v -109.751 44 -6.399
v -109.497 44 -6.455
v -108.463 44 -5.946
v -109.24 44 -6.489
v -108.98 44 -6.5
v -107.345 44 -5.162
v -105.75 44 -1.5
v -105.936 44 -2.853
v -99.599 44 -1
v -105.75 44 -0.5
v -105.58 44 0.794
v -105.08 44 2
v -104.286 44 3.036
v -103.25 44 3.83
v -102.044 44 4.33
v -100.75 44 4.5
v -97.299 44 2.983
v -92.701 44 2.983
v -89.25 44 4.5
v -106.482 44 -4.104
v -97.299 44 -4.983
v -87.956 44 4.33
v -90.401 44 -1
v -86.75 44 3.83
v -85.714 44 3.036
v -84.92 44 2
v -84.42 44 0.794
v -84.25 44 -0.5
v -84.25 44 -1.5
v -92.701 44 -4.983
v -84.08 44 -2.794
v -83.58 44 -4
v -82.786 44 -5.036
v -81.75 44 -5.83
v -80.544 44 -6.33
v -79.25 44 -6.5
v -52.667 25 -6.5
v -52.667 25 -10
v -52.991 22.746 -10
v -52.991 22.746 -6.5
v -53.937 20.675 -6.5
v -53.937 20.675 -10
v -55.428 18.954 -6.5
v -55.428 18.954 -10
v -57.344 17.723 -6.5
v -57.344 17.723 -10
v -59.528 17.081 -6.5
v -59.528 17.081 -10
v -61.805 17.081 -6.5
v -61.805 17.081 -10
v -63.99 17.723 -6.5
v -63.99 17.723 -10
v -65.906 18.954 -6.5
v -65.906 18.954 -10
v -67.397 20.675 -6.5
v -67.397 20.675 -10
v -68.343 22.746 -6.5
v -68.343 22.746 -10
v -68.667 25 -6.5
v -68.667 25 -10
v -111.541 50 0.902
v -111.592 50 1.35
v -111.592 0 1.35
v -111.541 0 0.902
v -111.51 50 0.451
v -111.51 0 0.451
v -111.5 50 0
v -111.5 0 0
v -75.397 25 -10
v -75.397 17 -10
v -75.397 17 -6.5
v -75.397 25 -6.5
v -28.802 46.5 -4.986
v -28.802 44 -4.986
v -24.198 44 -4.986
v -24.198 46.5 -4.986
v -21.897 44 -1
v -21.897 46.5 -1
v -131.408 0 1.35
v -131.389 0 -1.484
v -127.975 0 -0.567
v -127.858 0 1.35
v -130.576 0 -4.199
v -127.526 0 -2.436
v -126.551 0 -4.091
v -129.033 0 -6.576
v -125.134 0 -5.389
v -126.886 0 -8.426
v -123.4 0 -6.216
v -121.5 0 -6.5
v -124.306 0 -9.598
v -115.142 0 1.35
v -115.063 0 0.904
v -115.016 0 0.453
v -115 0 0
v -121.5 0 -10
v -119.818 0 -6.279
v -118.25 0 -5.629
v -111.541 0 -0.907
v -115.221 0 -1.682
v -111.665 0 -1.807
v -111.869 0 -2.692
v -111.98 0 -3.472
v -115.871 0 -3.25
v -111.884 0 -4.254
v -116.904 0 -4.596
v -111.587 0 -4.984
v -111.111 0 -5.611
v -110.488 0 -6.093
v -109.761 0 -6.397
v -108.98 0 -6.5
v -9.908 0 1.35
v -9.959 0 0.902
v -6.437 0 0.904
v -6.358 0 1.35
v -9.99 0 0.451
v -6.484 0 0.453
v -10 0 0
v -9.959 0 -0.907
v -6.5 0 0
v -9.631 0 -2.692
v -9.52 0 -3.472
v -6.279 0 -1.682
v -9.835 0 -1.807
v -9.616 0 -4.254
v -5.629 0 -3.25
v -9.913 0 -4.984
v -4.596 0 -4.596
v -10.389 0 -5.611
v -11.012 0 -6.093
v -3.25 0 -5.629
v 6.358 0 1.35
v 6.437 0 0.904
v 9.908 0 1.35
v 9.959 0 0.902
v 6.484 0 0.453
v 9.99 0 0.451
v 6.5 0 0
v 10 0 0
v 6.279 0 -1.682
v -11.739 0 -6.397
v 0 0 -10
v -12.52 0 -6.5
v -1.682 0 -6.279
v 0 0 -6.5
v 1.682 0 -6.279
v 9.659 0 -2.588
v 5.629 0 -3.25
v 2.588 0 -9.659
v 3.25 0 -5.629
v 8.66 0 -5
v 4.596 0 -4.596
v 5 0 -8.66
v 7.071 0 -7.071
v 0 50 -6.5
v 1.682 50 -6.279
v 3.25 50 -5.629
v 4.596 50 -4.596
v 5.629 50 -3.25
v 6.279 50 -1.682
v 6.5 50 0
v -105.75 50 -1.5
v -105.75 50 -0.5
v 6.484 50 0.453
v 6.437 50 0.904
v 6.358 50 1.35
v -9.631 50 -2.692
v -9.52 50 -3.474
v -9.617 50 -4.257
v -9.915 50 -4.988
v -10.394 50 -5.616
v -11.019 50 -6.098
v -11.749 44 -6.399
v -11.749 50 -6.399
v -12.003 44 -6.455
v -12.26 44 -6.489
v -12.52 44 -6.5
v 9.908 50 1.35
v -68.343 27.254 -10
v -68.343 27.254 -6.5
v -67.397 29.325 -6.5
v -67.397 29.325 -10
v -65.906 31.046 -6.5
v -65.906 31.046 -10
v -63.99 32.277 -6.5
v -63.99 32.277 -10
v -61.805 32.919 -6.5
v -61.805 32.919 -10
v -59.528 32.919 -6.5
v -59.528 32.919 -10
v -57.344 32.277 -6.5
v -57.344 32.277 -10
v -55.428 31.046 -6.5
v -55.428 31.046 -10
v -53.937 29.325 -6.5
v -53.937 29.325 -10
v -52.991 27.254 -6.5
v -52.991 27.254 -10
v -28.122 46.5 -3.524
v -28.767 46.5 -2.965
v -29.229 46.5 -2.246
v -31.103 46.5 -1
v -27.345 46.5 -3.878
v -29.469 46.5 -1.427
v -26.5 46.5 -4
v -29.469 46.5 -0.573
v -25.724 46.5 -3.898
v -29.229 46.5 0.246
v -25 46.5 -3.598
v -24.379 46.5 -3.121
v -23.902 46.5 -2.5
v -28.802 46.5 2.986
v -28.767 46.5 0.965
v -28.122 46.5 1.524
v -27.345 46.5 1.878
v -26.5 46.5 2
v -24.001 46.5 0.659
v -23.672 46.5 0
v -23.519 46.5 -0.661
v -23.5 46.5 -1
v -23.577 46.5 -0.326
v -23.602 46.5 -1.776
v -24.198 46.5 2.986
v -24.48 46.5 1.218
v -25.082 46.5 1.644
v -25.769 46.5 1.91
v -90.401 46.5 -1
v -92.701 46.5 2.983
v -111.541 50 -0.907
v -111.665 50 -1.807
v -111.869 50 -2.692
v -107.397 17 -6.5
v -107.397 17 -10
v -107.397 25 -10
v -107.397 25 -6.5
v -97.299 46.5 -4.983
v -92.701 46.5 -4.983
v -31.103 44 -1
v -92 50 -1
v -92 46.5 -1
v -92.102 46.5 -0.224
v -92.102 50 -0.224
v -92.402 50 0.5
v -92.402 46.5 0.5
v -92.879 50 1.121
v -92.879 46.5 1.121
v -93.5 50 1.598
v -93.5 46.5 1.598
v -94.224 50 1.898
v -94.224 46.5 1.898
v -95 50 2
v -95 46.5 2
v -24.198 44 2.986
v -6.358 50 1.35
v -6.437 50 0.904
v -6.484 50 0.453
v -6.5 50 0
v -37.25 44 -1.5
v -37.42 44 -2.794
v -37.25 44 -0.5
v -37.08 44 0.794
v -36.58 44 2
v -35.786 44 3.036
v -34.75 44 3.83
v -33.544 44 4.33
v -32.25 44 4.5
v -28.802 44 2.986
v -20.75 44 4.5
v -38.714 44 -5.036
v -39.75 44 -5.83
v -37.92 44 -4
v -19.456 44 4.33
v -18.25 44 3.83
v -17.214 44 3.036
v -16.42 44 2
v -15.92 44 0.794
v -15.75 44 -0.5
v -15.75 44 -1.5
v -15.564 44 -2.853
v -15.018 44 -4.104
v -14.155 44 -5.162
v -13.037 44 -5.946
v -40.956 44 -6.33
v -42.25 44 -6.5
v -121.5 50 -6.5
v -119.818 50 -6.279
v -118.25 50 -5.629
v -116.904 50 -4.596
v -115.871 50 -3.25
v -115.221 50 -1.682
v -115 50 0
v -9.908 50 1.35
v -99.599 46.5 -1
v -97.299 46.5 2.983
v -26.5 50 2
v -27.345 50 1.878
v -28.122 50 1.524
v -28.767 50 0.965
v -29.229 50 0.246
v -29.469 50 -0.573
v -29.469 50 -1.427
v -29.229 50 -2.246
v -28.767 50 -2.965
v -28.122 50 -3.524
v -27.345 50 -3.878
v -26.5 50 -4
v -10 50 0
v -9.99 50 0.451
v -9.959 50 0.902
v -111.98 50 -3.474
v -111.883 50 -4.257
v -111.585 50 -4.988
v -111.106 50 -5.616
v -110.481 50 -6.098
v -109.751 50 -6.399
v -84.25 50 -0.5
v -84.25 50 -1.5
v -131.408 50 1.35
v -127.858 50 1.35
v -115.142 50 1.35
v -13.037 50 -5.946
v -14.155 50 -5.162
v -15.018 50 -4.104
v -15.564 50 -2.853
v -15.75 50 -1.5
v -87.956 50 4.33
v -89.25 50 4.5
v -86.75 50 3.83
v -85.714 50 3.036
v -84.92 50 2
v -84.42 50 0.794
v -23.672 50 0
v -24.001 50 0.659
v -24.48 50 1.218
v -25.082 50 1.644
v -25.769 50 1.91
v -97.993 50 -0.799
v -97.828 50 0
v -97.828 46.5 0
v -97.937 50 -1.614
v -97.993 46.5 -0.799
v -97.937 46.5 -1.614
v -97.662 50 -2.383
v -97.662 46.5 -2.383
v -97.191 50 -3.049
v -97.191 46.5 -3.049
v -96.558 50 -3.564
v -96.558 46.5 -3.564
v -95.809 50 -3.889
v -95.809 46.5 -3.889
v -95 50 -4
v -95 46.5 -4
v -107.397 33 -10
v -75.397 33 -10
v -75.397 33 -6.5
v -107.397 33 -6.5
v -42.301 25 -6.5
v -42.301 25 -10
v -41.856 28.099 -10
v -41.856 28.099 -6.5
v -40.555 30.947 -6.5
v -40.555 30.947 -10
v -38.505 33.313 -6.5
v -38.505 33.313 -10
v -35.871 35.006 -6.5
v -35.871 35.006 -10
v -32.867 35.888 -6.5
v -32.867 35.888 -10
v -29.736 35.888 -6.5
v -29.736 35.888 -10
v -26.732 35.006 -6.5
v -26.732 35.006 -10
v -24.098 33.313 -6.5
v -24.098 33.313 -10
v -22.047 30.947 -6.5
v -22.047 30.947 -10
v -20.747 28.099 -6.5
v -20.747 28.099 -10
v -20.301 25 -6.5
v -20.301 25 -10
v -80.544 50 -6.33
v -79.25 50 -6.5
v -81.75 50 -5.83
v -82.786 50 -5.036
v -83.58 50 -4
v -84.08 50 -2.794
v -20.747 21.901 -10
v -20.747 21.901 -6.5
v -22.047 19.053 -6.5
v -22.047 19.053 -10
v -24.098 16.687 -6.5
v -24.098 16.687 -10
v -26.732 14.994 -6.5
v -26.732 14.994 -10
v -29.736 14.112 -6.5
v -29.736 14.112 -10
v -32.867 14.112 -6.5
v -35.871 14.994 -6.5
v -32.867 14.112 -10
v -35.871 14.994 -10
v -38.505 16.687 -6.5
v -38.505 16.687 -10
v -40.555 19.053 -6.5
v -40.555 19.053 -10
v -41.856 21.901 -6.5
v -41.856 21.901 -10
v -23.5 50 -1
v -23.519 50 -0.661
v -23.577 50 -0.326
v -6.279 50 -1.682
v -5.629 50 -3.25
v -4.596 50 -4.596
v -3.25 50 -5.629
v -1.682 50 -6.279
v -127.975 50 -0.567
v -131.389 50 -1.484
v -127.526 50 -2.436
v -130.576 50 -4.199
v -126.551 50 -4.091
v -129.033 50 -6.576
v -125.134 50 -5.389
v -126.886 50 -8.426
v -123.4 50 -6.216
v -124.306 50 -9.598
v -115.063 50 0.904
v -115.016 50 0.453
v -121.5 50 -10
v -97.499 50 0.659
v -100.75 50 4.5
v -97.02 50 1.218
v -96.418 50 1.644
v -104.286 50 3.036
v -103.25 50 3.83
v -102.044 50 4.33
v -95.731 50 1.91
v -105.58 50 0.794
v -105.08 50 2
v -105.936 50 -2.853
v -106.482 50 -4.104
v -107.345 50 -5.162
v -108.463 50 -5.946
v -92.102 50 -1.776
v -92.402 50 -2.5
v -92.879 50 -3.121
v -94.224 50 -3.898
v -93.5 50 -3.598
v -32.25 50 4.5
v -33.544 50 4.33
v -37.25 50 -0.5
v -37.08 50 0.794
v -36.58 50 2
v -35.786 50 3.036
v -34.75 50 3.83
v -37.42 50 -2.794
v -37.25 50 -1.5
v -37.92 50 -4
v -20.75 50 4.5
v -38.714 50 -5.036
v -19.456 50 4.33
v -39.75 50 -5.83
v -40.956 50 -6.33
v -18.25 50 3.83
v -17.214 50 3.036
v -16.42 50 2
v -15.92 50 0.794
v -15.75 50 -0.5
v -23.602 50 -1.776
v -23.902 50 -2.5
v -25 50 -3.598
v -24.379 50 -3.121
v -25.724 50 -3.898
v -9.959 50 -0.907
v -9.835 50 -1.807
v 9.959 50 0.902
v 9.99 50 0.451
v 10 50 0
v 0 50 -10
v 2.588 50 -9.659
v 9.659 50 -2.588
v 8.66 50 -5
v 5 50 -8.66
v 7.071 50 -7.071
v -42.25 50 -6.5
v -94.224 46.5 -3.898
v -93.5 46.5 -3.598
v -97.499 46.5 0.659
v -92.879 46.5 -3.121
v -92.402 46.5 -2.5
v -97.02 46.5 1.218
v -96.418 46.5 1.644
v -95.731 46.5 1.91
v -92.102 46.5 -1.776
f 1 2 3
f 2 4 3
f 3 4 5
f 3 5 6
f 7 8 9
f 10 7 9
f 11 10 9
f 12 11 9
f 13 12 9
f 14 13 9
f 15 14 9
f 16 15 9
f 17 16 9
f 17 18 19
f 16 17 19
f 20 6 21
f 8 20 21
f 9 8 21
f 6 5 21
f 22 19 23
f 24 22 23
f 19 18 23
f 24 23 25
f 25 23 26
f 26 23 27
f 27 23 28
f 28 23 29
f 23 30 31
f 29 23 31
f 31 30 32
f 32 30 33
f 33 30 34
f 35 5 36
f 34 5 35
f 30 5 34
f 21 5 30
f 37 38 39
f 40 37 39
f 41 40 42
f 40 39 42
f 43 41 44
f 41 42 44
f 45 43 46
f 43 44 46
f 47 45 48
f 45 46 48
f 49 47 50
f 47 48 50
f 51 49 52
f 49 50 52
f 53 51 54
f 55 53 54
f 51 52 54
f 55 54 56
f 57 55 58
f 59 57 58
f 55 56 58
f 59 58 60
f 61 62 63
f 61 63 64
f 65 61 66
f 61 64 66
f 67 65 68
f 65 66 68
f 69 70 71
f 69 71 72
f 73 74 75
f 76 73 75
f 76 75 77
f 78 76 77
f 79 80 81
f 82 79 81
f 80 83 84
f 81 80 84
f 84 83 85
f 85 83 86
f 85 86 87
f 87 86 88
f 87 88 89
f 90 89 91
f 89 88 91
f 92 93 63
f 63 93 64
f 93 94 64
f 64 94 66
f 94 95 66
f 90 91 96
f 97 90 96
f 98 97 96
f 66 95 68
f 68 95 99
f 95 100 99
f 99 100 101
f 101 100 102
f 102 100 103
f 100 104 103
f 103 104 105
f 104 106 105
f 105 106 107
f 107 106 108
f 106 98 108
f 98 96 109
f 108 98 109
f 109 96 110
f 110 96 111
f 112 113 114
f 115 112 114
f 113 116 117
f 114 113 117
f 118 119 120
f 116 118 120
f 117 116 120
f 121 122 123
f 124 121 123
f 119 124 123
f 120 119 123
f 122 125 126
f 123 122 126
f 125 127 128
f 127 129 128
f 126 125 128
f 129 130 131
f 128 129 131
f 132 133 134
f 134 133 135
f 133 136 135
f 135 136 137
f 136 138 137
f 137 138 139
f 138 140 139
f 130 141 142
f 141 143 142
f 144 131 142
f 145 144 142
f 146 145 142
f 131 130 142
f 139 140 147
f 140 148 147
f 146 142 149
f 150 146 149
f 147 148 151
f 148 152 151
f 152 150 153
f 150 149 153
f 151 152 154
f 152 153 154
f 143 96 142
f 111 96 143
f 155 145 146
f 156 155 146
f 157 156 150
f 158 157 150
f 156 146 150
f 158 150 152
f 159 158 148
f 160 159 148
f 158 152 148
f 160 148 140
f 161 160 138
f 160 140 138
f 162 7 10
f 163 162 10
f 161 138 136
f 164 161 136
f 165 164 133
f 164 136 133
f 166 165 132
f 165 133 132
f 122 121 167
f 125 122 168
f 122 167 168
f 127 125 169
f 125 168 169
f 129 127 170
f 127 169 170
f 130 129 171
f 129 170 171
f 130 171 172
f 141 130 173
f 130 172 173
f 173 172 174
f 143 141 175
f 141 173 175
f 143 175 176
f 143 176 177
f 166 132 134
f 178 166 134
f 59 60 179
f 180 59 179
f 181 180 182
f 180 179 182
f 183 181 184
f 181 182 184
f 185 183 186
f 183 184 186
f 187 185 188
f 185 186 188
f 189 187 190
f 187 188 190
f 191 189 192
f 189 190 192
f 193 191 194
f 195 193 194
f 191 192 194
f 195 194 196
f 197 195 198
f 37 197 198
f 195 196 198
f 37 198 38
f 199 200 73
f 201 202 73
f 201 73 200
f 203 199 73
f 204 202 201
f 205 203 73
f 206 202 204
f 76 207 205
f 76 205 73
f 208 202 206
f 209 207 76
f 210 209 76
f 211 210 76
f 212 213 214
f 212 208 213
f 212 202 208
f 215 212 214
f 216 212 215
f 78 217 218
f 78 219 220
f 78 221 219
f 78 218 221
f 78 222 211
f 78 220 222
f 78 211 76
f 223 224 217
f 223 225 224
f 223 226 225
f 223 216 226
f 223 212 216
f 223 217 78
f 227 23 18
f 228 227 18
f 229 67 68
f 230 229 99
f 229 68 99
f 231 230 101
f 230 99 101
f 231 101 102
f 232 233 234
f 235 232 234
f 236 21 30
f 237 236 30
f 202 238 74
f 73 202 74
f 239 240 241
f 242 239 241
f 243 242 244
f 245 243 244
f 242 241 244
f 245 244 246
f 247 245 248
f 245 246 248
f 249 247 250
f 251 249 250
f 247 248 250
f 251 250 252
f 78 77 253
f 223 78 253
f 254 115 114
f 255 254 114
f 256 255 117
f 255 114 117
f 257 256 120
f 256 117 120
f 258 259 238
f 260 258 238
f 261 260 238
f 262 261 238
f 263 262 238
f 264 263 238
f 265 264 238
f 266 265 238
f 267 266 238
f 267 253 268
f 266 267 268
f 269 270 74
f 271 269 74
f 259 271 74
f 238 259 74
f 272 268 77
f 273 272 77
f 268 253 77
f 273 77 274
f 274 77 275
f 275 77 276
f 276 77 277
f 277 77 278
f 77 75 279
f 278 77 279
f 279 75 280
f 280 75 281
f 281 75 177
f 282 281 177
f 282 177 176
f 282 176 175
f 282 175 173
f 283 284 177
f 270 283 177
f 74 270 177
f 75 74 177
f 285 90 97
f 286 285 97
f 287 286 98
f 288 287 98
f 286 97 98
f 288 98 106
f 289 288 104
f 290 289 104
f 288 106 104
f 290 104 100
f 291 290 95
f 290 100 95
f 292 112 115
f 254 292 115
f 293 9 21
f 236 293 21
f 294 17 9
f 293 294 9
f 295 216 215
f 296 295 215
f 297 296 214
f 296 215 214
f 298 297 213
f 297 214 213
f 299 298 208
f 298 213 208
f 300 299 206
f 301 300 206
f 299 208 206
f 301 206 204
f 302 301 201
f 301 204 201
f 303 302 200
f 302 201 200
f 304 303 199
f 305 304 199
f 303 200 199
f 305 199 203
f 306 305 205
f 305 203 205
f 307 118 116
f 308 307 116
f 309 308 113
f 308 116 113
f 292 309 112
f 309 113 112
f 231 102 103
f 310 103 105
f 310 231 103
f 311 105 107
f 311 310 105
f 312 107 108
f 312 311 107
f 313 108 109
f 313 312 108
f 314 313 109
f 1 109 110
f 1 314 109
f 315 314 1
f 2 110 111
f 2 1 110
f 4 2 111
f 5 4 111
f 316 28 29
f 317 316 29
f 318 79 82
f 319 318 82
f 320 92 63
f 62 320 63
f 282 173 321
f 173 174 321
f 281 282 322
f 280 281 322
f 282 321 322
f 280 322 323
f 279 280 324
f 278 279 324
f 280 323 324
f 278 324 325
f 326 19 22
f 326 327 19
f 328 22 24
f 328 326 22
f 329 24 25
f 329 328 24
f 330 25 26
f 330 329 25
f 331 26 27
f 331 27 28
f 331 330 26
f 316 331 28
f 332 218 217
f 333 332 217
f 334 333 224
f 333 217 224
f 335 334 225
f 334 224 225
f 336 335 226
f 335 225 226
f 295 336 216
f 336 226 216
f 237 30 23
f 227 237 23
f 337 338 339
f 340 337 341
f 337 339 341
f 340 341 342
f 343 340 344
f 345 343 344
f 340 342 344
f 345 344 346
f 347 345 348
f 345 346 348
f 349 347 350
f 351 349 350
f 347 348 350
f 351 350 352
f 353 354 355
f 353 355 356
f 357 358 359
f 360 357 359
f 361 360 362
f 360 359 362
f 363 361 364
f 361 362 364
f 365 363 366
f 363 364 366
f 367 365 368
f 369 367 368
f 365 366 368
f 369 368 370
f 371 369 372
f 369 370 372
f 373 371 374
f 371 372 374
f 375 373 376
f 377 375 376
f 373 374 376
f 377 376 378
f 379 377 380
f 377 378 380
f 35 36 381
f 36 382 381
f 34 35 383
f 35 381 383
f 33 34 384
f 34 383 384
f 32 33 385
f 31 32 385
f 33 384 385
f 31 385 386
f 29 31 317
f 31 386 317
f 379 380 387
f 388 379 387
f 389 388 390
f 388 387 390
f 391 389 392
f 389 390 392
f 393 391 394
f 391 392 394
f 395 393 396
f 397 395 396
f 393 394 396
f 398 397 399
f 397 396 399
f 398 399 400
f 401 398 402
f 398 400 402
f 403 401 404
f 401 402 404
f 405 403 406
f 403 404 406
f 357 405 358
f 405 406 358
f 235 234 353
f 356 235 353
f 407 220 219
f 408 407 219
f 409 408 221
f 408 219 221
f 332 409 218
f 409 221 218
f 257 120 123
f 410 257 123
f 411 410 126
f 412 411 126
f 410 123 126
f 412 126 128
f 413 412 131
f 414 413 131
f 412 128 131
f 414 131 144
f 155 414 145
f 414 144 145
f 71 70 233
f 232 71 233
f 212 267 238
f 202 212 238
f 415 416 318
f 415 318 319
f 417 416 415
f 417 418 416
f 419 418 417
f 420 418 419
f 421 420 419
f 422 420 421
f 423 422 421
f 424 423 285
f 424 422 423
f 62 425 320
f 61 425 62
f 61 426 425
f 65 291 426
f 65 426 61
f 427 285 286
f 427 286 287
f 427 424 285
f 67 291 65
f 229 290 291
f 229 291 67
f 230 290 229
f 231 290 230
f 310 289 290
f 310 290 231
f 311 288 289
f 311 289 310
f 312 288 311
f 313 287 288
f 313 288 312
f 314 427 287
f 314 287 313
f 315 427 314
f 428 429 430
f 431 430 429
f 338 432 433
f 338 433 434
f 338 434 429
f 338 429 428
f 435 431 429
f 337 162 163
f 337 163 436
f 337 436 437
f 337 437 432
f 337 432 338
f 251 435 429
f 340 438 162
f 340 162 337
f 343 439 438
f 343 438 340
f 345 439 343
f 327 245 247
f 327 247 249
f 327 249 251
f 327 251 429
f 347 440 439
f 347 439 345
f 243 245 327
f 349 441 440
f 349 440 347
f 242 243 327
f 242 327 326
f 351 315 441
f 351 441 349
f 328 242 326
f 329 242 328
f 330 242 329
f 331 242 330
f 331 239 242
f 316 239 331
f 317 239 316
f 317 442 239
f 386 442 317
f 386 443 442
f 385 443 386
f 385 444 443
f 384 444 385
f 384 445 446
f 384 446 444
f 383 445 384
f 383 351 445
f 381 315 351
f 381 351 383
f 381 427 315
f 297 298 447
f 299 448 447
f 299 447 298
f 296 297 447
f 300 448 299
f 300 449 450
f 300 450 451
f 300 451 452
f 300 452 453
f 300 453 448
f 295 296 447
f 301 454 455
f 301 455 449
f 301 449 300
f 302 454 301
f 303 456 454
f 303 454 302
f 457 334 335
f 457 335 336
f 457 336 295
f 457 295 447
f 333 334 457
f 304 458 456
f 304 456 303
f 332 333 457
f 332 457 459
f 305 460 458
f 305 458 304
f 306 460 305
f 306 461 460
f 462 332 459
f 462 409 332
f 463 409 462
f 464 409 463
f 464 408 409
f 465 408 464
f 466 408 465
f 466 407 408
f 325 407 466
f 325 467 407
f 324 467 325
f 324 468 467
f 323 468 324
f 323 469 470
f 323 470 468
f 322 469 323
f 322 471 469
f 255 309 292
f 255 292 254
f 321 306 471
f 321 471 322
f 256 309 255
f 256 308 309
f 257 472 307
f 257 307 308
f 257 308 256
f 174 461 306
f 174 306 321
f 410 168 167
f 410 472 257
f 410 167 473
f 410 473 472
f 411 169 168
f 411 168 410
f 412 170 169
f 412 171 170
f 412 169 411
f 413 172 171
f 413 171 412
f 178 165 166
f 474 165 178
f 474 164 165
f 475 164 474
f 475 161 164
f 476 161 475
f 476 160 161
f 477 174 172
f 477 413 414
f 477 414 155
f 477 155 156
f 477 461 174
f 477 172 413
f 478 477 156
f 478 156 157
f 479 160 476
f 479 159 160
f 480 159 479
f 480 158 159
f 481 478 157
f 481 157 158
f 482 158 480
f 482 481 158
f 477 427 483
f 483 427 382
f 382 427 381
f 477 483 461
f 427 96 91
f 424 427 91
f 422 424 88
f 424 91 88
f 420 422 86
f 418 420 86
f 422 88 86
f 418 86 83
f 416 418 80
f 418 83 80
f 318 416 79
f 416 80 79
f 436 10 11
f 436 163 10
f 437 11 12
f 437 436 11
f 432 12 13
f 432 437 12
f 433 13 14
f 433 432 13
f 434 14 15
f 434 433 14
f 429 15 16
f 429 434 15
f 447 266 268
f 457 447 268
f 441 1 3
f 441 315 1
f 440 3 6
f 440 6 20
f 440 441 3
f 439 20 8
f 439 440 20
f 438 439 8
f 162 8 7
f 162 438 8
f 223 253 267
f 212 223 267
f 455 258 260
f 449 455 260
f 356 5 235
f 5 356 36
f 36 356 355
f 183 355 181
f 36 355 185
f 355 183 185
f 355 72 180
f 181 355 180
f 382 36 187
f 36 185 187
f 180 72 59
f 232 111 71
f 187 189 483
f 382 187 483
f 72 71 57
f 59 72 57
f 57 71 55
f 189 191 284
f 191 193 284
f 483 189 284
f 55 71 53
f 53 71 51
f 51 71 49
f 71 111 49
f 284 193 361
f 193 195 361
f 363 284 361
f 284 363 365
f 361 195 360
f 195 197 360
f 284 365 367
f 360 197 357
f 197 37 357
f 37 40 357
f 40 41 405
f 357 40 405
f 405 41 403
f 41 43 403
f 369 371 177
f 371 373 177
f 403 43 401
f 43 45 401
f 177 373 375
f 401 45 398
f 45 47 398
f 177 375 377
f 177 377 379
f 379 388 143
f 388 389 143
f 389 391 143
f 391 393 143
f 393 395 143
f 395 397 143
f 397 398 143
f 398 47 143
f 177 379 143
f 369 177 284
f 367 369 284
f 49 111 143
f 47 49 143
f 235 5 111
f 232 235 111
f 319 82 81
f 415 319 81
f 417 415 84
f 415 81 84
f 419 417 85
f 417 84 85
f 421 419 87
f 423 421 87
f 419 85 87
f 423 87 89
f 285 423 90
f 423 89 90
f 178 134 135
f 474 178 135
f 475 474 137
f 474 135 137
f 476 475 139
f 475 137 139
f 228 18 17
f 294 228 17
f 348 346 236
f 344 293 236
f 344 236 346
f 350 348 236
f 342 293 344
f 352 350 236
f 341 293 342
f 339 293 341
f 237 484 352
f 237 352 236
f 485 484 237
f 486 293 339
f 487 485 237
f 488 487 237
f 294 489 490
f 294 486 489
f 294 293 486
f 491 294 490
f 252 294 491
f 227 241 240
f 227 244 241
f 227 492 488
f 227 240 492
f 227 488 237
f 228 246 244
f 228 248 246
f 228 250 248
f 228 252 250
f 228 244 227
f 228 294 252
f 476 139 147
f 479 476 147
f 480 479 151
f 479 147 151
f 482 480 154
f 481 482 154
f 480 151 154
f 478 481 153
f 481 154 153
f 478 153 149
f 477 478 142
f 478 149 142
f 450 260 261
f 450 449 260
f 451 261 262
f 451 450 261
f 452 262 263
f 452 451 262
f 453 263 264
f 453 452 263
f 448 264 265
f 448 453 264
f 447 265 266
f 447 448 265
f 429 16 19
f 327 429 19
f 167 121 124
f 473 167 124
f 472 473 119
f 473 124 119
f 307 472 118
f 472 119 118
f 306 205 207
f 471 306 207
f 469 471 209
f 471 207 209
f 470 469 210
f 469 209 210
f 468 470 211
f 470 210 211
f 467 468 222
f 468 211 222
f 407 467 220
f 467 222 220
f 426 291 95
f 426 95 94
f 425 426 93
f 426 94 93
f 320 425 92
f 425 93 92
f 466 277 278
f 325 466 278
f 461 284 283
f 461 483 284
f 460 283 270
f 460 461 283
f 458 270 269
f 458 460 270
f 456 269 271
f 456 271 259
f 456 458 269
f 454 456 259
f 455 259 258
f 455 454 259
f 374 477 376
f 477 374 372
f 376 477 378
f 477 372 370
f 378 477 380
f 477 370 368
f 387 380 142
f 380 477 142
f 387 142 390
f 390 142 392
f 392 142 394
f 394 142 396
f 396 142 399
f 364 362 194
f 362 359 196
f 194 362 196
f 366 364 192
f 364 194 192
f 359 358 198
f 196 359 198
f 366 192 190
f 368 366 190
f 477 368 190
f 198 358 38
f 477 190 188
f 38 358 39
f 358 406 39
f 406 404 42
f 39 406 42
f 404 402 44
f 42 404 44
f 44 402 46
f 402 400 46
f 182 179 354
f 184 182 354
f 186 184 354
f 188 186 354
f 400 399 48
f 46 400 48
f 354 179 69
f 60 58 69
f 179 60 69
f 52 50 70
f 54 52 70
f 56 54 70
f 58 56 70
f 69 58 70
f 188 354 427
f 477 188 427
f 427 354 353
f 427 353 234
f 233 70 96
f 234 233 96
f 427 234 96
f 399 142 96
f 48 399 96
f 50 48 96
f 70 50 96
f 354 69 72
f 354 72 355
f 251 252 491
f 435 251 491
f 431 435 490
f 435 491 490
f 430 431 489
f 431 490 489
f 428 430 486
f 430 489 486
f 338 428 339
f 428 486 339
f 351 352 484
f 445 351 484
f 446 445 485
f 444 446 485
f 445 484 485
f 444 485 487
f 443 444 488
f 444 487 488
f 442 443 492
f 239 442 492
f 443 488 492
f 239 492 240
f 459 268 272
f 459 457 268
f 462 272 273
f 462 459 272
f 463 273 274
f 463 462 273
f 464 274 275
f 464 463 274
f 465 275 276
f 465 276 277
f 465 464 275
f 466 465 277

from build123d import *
from build123d.topology import SkipClean

# Parameters (mm, degrees)
BOSS_EXTRUDE2_DEPTH = 50
BOSS_EXTRUDE3_START = -6
BOSS_EXTRUDE3_DEPTH = 6
BOSS_EXTRUDE4_START = 44
BOSS_EXTRUDE4_DEPTH = 44
FILLET1_R           = 5
FILLET2_R           = 3
CUT_EXTRUDE3_DEPTH  = 2.5
SKETCH6_W           = 32
SKETCH6_H           = 8
CUT_EXTRUDE4_DEPTH  = 10


with BuildPart() as part:
    # Sketch1 → Boss-Extrude2 (new body)
    with BuildSketch(Plane(origin=(0, 0, 0), x_dir=(1, 0, 0), z_dir=(0, 1, 0))):
        with BuildLine():
            Line((0, 10), (0, 6.5))
            ThreePointArc((0, 6.5), (4.596194, 4.596194), (6.5, 0))
            ThreePointArc((6.5, 0), (6.464444, -0.678941), (6.358166, -1.350454))
            Line((6.358166, -1.350454), (9.908394, -1.350454))
            ThreePointArc((9.908394, -1.350454), (9.977072, -0.676779), (10, 0))
            ThreePointArc((10, 0), (7.071068, 7.071068), (0, 10))
        make_face()
        with BuildLine():
            ThreePointArc((0, 10), (-4.1833, 9.082951), (-7.599342, 6.5))
            Line((-7.599342, 6.5), (0, 6.5))
            Line((0, 6.5), (0, 10))
        make_face()
        with BuildLine():
            ThreePointArc((-121.5, 10), (-117.3167, 9.082951), (-113.900658, 6.5))
            Line((-113.900658, 6.5), (-7.599342, 6.5))
            ThreePointArc((-7.599342, 6.5), (-4.1833, 9.082951), (0, 10))
            Line((0, 10), (-121.5, 10))
        make_face()
        with BuildLine():
            ThreePointArc((-7.599342, 6.5), (-9.380656, 3.464576), (-10, 0))
            Line((-10, 0), (-6.5, 0))
            ThreePointArc((-6.5, 0), (-4.596194, 4.596194), (0, 6.5))
            Line((0, 6.5), (-7.599342, 6.5))
        make_face()
        with BuildLine():
            Line((-6.5, 0), (-10, 0))
            ThreePointArc((-10, 0), (-9.977072, -0.676779), (-9.908394, -1.350454))
            Line((-9.908394, -1.350454), (-6.358166, -1.350454))
            ThreePointArc((-6.358166, -1.350454), (-6.464444, -0.678941), (-6.5, 0))
        make_face()
        with BuildLine():
            Line((-115, 0), (-111.5, 0))
            ThreePointArc((-111.5, 0), (-112.119344, 3.464576), (-113.900658, 6.5))
            Line((-113.900658, 6.5), (-121.5, 6.5))
            ThreePointArc((-121.5, 6.5), (-116.903806, 4.596194), (-115, 0))
        make_face()
        with BuildLine():
            Line((-121.5, 6.5), (-113.900658, 6.5))
            ThreePointArc((-113.900658, 6.5), (-117.3167, 9.082951), (-121.5, 10))
            ThreePointArc((-121.5, 10), (-129.03341, 6.576301), (-131.408394, -1.350454))
            Line((-131.408394, -1.350454), (-127.858166, -1.350454))
            ThreePointArc((-127.858166, -1.350454), (-126.551136, 4.090969), (-121.5, 6.5))
        make_face()
    extrude(amount=BOSS_EXTRUDE2_DEPTH)

    # Sketch2 → Boss-Extrude3 (add)
    with BuildSketch(Plane(origin=(0, 50, 0), x_dir=(1, 0, 0), z_dir=(0, 1, 0)).offset(BOSS_EXTRUDE3_START)):
        with BuildLine():
            Line((-84.25, -4.5), (-84.25, 6.5))
            Line((-84.25, 6.5), (-95, 6.5))
            Line((-95, 6.5), (-95, 4))
            ThreePointArc((-95, 4), (-92.87868, 3.12132), (-92, 1))
            ThreePointArc((-92, 1), (-92.87868, -1.12132), (-95, -2))
            Line((-95, -2), (-95, -4.5))
            Line((-95, -4.5), (-84.25, -4.5))
        make_face()
        with BuildLine():
            Line((-105.75, -4.5), (-95, -4.5))
            Line((-95, -4.5), (-95, -2))
            ThreePointArc((-95, -2), (-96.732051, -1.44949), (-97.828427, 0))
            Line((-97.828427, 0), (-105.75, 0))
            Line((-105.75, 0), (-105.75, -4.5))
        make_face()
        with BuildLine():
            Line((-95, 4), (-95, 6.5))
            Line((-95, 6.5), (-105.75, 6.5))
            Line((-105.75, 6.5), (-105.75, 0))
            Line((-105.75, 0), (-97.828427, 0))
            ThreePointArc((-97.828427, 0), (-97.44949, 2.732051), (-95, 4))
        make_face()
        with BuildLine():
            Line((-26.5, 6.5), (-37.25, 6.5))
            Line((-37.25, 6.5), (-37.25, -4.5))
            Line((-37.25, -4.5), (-26.5, -4.5))
            Line((-26.5, -4.5), (-26.5, -2))
            ThreePointArc((-26.5, -2), (-29.5, 1), (-26.5, 4))
            Line((-26.5, 4), (-26.5, 6.5))
        make_face()
        with BuildLine():
            Line((-15.75, 6.5), (-26.5, 6.5))
            Line((-26.5, 6.5), (-26.5, 4))
            ThreePointArc((-26.5, 4), (-24.37868, 3.12132), (-23.5, 1))
            ThreePointArc((-23.5, 1), (-23.543204, 0.492694), (-23.671573, 0))
            Line((-23.671573, 0), (-15.75, 0))
            Line((-15.75, 0), (-15.75, 6.5))
        make_face()
        with BuildLine():
            Line((-26.5, -2), (-26.5, -4.5))
            Line((-26.5, -4.5), (-15.75, -4.5))
            Line((-15.75, -4.5), (-15.75, 0))
            Line((-15.75, 0), (-23.671573, 0))
            ThreePointArc((-23.671573, 0), (-24.767949, -1.44949), (-26.5, -2))
        make_face()
        with BuildLine():
            ThreePointArc((-111.5, 0), (-112.119344, 3.464576), (-113.900658, 6.5))
            ThreePointArc((-113.900658, 6.5), (-125.591496, 9.124673), (-131.408394, -1.350454))
            Line((-131.408394, -1.350454), (-127.858166, -1.350454))
            ThreePointArc((-127.858166, -1.350454), (-122.178941, 6.464444), (-115, 0))
            Line((-115, 0), (-111.5, 0))
        make_face()
        with BuildLine():
            ThreePointArc((-111.591606, -1.350454), (-111.522928, -0.676779), (-111.5, 0))
            Line((-111.5, 0), (-115, 0))
            ThreePointArc((-115, 0), (-115.035556, -0.678941), (-115.141834, -1.350454))
            Line((-115.141834, -1.350454), (-111.591606, -1.350454))
        make_face()
    extrude(amount=BOSS_EXTRUDE3_DEPTH)

    # Sketch3 → Boss-Extrude4 (add)
    with SkipClean():  # the faces are left unmerged after this step: merging them gives an invalid solid
        with BuildSketch(Plane.XZ.offset(-44).offset(BOSS_EXTRUDE4_START)):
            with BuildLine():
                Line((-111.591606, 1.350454), (-115.141834, 1.350454))
                ThreePointArc((-115.141834, 1.350454), (-115.035556, 0.678941), (-115, 0))
                Line((-115, 0), (-111.5, 0))
                ThreePointArc((-111.5, 0), (-111.522928, 0.676779), (-111.591606, 1.350454))
            make_face()
        extrude(amount=-BOSS_EXTRUDE4_DEPTH)

    # Fillet1
    fillet1_edges = [part.edges().sort_by_distance(p)[0] for p in [
        (-105.75, 47, 4.5),
        (-105.75, 47, -6.5),
        (-84.25, 47, -6.5),
        (-84.25, 47, 4.5),
        (-15.75, 47, -6.5),
        (-15.75, 47, 4.5),
        (-37.25, 47, 4.5),
        (-37.25, 47, -6.5),
    ]]
    fillet(fillet1_edges, radius=FILLET1_R)

    # Fillet2
    fillet2_edges = [part.edges().sort_by_distance(p)[0] for p in [
        (-7.599342, 25, -6.5),
        (-113.900658, 25, -6.5),
    ]]
    fillet(fillet2_edges, radius=FILLET2_R)

    # Sketch5 → Cut-Extrude3 (cut)
    with SkipClean():  # the faces are left unmerged after this step: merging them gives an invalid solid
        with BuildSketch(Plane.XZ.offset(-44)):
            Polygon((-21.896884, -1), (-24.198442, 2.986415), (-28.801558, 2.986415), (-31.103116, -1), (-28.801558, -4.986415), (-24.198442, -4.986415), align=None)
            Polygon((-90.401179, -1), (-92.70059, 2.982696), (-97.29941, 2.982696), (-99.598821, -1), (-97.29941, -4.982696), (-92.70059, -4.982696), align=None)
        extrude(amount=-CUT_EXTRUDE3_DEPTH, mode=Mode.SUBTRACT)

    # Sketch6 → Cut-Extrude4 (cut)
    with SkipClean():  # the faces are left unmerged after this step: merging them gives an invalid solid
        with BuildSketch(Plane(origin=(0, 0, -10), x_dir=(-1, 0, 0), z_dir=(0, 0, -1))):
            with Locations((91.396524, 21)):
                Rectangle(SKETCH6_W, SKETCH6_H)
            with Locations((91.396524, 29)):
                Rectangle(SKETCH6_W, SKETCH6_H)
            with BuildLine():
                ThreePointArc((68.666891, 25), (60.666891, 33), (52.666891, 25))
                Line((52.666891, 25), (68.666891, 25))
            make_face()
            with BuildLine():
                Line((68.666891, 25), (52.666891, 25))
                ThreePointArc((52.666891, 25), (60.666891, 17), (68.666891, 25))
            make_face()
            with BuildLine():
                ThreePointArc((20.301131, 25), (31.301131, 14), (42.301131, 25))
                Line((42.301131, 25), (20.301131, 25))
            make_face()
            with BuildLine():
                Line((20.301131, 25), (42.301131, 25))
                ThreePointArc((42.301131, 25), (31.301131, 36), (20.301131, 25))
            make_face()
        extrude(amount=-CUT_EXTRUDE4_DEPTH, mode=Mode.SUBTRACT)


solid = part.part
